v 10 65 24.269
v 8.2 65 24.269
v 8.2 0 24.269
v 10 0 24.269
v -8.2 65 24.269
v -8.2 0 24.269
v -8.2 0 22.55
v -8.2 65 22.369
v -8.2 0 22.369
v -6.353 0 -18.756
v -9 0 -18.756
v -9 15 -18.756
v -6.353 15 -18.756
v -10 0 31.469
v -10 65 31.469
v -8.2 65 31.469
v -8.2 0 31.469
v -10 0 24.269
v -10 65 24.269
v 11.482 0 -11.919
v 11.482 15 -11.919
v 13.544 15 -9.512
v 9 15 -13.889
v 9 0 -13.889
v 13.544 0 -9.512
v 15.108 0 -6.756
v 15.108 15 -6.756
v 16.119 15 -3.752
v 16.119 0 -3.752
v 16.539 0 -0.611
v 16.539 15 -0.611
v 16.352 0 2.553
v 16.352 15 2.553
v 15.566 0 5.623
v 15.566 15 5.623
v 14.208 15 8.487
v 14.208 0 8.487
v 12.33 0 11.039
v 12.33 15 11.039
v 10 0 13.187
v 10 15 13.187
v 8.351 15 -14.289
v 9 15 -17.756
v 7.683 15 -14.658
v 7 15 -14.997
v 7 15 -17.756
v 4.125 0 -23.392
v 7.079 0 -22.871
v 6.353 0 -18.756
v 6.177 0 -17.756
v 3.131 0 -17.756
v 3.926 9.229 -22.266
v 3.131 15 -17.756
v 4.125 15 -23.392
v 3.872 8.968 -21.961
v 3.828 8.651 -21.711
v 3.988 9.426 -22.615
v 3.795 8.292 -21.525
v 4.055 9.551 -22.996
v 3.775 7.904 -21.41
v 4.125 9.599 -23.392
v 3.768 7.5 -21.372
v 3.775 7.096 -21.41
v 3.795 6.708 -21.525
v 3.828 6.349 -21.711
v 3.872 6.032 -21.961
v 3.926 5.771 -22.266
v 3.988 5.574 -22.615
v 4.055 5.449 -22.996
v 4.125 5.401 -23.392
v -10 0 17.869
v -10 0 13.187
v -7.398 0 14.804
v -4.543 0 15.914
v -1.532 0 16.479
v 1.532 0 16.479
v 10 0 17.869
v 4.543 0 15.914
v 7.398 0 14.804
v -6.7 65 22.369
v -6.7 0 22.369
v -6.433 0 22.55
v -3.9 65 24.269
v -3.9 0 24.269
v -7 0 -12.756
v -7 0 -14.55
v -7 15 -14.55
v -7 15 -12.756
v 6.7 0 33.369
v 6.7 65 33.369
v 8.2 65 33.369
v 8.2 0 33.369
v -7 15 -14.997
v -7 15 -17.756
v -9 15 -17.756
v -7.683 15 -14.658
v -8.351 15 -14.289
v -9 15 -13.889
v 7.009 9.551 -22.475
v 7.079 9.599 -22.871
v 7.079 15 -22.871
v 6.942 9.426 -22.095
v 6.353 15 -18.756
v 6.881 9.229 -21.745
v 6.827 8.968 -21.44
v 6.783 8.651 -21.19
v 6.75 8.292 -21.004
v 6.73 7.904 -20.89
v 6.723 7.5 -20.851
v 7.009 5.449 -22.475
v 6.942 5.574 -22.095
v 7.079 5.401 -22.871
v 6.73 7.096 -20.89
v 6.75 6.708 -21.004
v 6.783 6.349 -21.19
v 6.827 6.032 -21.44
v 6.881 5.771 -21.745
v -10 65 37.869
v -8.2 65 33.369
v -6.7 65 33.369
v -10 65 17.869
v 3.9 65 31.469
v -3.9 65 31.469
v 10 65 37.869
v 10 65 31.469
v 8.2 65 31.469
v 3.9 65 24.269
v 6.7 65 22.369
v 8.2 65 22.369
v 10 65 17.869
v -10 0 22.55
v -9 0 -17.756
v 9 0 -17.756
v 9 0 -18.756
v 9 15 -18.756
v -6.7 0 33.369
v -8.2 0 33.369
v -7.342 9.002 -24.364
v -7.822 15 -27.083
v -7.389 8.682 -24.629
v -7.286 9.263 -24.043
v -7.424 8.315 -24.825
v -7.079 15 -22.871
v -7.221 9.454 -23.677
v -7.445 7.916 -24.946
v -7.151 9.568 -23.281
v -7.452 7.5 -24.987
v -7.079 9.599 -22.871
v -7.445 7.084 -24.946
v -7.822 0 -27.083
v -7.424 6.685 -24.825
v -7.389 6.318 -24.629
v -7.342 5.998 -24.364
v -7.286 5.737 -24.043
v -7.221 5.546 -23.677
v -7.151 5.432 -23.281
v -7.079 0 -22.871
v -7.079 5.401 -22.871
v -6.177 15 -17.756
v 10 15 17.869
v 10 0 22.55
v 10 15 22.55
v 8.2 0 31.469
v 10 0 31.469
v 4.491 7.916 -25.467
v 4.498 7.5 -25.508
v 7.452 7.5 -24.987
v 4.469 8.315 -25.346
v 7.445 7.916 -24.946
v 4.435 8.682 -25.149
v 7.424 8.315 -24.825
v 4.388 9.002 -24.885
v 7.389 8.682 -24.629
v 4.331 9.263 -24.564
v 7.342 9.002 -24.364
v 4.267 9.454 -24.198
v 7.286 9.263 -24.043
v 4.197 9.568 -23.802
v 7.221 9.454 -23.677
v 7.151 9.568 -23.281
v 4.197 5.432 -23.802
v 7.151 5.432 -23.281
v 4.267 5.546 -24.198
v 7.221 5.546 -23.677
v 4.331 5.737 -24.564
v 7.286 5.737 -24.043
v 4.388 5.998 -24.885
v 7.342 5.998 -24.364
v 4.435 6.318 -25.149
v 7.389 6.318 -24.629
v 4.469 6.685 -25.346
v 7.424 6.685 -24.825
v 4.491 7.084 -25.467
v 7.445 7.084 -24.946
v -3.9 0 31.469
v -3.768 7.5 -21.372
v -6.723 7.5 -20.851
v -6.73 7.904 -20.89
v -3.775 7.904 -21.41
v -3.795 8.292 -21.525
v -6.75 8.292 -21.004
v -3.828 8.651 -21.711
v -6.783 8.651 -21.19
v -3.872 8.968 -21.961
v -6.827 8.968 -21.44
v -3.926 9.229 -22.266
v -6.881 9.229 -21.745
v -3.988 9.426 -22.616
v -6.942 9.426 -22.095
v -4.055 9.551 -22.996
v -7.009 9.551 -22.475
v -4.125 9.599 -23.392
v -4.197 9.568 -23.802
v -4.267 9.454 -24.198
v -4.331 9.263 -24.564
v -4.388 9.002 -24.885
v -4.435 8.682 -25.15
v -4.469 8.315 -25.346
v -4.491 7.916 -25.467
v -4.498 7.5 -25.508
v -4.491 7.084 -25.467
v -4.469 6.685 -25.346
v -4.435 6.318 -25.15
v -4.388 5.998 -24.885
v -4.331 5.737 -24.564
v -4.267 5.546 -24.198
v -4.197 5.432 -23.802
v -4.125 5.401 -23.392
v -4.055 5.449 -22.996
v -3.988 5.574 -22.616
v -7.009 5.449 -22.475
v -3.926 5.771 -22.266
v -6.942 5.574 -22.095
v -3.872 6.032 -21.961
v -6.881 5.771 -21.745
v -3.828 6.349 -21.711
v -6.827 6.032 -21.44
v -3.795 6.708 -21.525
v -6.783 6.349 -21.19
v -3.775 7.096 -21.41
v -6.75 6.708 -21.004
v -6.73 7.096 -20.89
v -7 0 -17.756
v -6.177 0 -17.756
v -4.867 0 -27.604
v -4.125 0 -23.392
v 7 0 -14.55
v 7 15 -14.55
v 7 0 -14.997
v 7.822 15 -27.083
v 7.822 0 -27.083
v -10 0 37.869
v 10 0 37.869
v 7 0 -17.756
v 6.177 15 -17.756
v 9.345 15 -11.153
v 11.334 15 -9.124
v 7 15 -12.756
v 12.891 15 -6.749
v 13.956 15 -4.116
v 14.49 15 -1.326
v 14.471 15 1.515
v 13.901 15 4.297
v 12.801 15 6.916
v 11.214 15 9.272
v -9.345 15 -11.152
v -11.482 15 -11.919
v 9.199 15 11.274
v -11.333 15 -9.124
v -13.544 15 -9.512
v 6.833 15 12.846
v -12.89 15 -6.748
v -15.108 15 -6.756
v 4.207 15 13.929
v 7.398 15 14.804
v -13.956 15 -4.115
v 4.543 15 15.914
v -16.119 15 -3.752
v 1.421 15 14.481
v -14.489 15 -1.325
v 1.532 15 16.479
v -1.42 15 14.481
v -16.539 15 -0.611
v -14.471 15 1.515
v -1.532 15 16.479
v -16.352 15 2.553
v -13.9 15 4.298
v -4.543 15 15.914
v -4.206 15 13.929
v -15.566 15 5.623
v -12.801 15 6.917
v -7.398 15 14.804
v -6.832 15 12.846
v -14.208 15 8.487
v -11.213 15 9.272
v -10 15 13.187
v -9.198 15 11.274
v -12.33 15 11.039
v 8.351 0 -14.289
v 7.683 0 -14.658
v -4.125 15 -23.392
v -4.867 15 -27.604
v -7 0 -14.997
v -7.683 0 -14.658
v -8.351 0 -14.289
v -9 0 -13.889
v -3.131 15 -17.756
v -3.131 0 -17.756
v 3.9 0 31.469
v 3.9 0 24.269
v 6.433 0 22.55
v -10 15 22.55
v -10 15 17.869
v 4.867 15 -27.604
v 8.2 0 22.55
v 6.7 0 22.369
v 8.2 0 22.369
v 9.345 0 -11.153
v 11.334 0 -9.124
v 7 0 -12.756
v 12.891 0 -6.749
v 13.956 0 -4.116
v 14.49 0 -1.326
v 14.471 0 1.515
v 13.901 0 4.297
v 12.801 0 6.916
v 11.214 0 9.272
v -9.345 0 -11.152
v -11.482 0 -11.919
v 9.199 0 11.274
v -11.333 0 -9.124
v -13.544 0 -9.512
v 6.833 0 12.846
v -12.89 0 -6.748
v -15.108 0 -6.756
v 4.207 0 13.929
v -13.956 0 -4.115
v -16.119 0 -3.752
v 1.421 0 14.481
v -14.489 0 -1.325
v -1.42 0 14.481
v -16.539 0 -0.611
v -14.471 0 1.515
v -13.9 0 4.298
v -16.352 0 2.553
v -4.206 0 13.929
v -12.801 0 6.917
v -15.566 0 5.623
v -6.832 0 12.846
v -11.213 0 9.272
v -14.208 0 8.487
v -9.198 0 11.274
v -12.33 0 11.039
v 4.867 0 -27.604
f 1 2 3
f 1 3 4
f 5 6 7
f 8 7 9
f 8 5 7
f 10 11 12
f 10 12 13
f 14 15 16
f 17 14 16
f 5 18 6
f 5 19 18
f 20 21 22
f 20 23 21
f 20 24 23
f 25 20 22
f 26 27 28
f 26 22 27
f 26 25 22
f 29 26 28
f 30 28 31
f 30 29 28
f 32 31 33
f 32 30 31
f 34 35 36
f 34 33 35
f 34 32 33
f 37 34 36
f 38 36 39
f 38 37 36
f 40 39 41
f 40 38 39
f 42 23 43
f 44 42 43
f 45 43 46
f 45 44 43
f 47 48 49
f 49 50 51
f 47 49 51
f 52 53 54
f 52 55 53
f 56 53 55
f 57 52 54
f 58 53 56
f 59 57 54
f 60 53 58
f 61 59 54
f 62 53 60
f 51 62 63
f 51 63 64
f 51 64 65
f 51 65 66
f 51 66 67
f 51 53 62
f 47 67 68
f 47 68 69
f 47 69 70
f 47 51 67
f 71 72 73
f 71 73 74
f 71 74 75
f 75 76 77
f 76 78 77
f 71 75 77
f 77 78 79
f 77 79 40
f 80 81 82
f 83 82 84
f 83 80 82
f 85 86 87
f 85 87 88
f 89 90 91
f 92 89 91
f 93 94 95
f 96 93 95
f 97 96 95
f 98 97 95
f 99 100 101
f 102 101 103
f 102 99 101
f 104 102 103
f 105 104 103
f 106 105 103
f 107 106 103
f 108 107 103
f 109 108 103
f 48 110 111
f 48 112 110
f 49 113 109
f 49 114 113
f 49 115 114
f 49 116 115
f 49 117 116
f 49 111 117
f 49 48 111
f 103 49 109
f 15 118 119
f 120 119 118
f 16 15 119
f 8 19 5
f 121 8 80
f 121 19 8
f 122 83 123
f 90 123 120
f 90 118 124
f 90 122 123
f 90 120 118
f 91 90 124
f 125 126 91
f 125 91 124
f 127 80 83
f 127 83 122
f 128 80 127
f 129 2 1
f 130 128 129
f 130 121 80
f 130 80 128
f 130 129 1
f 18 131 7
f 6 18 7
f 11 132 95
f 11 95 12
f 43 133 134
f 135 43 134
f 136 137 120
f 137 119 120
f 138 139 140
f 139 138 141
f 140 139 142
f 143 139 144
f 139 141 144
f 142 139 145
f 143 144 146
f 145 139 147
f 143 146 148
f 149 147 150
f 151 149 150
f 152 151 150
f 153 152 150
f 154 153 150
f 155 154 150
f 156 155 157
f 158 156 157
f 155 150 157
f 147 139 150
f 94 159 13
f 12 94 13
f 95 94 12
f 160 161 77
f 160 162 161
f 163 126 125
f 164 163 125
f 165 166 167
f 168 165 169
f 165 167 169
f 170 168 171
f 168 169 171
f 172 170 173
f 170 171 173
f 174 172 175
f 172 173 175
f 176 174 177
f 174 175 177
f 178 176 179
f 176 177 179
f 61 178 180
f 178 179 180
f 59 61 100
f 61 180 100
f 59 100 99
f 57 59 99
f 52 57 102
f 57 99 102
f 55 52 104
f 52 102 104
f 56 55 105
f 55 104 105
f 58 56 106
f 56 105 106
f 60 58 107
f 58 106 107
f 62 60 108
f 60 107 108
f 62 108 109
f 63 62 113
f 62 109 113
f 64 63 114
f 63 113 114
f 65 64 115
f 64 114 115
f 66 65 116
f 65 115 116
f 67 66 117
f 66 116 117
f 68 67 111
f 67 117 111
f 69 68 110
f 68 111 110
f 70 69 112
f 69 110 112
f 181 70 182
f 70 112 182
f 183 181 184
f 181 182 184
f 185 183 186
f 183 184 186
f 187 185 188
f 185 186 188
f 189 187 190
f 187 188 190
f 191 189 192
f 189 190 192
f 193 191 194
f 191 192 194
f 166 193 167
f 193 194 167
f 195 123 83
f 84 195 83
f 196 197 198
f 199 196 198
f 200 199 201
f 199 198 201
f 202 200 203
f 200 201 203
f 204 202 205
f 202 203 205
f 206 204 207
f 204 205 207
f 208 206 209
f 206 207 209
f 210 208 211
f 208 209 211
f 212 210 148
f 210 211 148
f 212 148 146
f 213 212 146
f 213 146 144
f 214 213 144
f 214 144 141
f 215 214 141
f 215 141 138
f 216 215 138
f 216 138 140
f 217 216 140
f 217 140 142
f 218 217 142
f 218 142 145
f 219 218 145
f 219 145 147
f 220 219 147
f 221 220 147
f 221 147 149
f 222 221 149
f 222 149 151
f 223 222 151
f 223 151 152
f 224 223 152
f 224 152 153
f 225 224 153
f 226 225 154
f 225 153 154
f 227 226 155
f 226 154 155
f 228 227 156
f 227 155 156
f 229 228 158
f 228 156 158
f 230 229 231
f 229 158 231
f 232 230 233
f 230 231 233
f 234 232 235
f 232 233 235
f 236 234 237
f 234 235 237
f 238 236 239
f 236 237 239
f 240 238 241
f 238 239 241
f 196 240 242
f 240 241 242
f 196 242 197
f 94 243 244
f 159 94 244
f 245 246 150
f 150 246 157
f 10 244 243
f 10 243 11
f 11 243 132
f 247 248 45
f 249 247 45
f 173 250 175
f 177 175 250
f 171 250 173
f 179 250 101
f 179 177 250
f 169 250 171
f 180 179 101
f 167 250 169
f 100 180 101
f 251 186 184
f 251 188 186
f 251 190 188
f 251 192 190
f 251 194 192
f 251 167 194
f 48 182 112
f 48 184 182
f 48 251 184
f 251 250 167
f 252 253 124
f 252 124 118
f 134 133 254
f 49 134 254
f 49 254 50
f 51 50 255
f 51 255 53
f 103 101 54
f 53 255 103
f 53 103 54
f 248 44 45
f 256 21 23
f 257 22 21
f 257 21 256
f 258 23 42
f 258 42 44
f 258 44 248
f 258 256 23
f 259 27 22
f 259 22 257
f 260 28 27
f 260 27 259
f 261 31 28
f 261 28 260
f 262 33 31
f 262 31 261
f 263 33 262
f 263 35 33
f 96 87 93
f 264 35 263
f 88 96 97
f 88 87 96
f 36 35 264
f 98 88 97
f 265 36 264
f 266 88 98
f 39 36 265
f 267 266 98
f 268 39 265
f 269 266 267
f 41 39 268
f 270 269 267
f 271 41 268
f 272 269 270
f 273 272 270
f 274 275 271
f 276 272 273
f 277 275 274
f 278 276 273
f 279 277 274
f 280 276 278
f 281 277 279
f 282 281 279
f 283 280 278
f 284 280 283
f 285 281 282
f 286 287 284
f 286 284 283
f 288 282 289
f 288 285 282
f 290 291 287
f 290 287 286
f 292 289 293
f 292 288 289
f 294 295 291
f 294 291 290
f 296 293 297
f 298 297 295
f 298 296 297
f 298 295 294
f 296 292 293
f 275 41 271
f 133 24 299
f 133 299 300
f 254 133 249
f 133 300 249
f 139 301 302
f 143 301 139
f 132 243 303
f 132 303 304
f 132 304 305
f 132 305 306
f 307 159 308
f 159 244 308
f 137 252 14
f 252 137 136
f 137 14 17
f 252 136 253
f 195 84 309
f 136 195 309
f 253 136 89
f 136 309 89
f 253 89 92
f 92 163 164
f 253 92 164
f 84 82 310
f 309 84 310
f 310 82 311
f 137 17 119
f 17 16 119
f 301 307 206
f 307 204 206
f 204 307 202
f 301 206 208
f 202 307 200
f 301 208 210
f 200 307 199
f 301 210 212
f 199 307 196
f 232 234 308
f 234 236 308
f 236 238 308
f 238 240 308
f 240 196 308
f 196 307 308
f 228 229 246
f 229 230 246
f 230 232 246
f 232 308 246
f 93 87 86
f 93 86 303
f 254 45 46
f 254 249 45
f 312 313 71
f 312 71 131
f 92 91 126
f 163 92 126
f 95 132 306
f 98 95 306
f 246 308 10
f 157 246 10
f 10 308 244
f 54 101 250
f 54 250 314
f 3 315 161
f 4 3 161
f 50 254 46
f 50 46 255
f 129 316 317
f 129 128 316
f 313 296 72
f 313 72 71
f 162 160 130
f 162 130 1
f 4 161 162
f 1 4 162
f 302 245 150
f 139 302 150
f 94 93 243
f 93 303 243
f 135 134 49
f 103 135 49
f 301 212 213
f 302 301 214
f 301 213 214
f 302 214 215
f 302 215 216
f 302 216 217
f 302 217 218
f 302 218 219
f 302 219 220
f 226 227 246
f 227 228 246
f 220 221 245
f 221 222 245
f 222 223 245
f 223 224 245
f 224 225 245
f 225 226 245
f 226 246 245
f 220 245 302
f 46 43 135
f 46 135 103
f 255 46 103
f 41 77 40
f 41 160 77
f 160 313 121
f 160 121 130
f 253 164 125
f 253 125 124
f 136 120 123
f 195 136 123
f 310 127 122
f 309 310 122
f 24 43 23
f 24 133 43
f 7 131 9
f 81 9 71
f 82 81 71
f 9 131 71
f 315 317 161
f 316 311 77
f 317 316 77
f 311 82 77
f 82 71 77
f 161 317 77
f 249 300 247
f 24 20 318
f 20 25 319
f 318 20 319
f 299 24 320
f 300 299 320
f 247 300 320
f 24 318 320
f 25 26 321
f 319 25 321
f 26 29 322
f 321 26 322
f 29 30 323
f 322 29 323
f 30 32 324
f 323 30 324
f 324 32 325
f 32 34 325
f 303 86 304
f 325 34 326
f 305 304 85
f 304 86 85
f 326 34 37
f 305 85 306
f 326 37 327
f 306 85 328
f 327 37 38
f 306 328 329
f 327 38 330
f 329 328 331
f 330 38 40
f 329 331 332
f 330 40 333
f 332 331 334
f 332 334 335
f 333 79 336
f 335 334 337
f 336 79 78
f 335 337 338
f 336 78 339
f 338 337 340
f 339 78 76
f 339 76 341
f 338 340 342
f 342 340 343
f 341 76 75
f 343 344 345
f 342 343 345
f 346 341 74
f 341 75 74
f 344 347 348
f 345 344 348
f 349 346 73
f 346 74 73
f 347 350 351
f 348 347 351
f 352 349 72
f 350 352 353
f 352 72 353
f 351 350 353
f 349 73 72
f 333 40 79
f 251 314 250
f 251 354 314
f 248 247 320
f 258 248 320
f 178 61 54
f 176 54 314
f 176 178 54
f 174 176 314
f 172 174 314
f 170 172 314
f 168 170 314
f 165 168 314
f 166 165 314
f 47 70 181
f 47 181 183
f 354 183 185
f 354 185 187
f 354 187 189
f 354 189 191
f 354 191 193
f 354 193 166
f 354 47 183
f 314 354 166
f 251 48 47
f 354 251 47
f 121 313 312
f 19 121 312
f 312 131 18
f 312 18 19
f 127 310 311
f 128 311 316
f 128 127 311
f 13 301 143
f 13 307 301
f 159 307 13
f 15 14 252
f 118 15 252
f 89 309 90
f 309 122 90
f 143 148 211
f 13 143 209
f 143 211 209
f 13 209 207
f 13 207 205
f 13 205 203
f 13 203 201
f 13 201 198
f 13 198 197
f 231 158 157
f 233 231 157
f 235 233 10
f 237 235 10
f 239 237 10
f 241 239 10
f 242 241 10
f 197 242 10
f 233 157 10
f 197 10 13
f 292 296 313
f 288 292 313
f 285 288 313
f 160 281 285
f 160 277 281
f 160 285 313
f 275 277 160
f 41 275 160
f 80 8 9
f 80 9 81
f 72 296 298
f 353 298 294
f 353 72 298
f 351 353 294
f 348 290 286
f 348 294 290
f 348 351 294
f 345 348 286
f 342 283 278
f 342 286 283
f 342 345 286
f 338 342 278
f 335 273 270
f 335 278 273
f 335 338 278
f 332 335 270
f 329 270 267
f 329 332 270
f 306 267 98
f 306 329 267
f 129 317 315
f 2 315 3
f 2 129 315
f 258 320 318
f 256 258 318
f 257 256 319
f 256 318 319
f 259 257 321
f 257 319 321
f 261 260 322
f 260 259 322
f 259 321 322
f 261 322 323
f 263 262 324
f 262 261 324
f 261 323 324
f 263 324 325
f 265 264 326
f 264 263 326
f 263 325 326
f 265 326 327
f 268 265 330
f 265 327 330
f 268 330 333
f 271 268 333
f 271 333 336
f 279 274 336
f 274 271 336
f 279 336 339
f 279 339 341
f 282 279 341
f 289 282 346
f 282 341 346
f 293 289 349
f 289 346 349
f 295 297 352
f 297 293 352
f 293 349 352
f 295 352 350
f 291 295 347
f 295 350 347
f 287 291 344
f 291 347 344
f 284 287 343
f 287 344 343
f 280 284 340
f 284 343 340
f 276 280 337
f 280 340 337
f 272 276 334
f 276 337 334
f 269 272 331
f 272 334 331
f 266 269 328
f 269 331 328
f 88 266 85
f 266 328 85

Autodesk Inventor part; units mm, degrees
ref_plane "YZ Plane" through (0, 0, 0) normal (1, 0, 0) x (0, 1, 0)
ref_plane "XZ Plane" through (0, 0, 0) normal (0, 1, 0) x (-1, 0, 0)
ref_plane "XY Plane" through (0, 0, 0) normal (0, 0, 1) x (1, 0, 0)
sketch "스케치1" plane through (0, 0, 0) normal (0, 1, 0) x (-1, 0, 0)
  arc A0 (0, -14.55) -> (-2.5266, -14.329) centre (0, 0) ccw
  line L0 (-2.5656, -14.55) -> (-7, -14.55)
  line L1 (7, -14.55) -> (7, -12.7555)
  line L2 (-7, -14.55) -> (-7, -12.7555)
  arc A1 (2.8739, -16.2986) -> (-2.8739, -16.2986) centre (0, 0) ccw
  line L3 (7, -12.7555) -> (7, -17.7555)
  line L4 (-7, -12.7555) -> (-7, -17.7555)
  line L5 (-7, -17.7555) -> (-9, -17.7555)
  line L6 (-9, -17.7555) -> (-9, -13.8889)
  line L7 (7, -17.7555) -> (9, -17.7555)
  line L8 (9, -17.7555) -> (9, -13.8889)
  line L9 (0, 0) -> (23.7529, 0) construction
  line L10 (0, 0) -> (23.7529, 0) construction
  line L11 (4.1247, -23.3921) -> (7.0791, -22.8711)
  line L12 (7.0791, -22.8711) -> (6.1771, -17.7555)
  line L13 (-4.1247, -23.3921) -> (-7.0791, -22.8711)
  line L14 (-7.0791, -22.8711) -> (-6.1771, -17.7555)
  line L15 (-7, -17.7555) -> (-3.1308, -17.7555)
  line L16 (-9, -17.7555) -> (-9, -18.7555)
  line L17 (-9, -18.7555) -> (-6.3534, -18.7555)
  line L18 (9, -17.7555) -> (9, -18.7555)
  line L19 (9, -18.7555) -> (6.3534, -18.7555)
  line L20 (7, -17.7555) -> (6.1771, -17.7555)
  line L21 (6.1771, -17.7555) -> (3.1308, -17.7555)
  line L22 (0, 0) -> (-2.8739, -16.2986)
  line L23 (-3.1308, -17.7555) -> (-4.1247, -23.3921)
  line L24 (0, 0) -> (2.8739, -16.2986)
  line L25 (3.1308, -17.7555) -> (4.1247, -23.3921)
  line L26 (-7, -14.55) -> (-2.5656, -14.55)
  line L27 (0, -14.55) -> (7, -14.55)
  line L28 (3.1308, -17.7555) -> (4.8673, -27.6036)
  line L29 (4.8673, -27.6036) -> (7.8217, -27.0826)
  line L30 (7.8217, -27.0826) -> (7.0791, -22.8711)
  line L31 (-3.1308, -17.7555) -> (-4.8673, -27.6036)
  line L32 (-4.8673, -27.6036) -> (-7.8217, -27.0826)
  line L33 (-7.8217, -27.0826) -> (-7.0791, -22.8711)
  point P0 (-7, -14.9967)
  dimension "d0" = 29.1
  dimension "d1" = 7
  dimension "d2" = 14
  dimension "d3" = 2
  dimension "d4" = 5
  dimension "d5" = 2
  dimension "d6" = 2
  dimension "d7" = 5
  dimension "d10" = 3
  dimension "d11" = 1
  dimension "d14" = 10
  dimension "d15" = 10
extrude "돌출1" add sketch "스케치1" along normal blind 15 contours A0 L2 L4 A1 L3 L1 | A1 L8 L7 L3 | L4 L5 L6 A1 | L7 L18 L19 L12 L20 | L15 L14 L17 L16 L5 | L12 L11 L25 L21 | L15 L23 L13 L14 | L30 L29 L28 L11 | L13 L31 L32 L33
sketch "스케치2" plane through (7.8217, 0, -27.0826) normal (0.9848, 0, 0.1736) x (0.1736, 0, -0.9848)
  line L0 (0, 0) -> (0, 15) projected
  line L1 (-8.4556, 0) -> (-8.4556, 15) projected
  line L2 (0, 15) -> (-8.4556, 15)
  circle A0 centre (-4.2278, 7.5) radius 2.1
  point P0 (-28.0294, 0)
  dimension "d16" = 4.2
extrude "돌출2" cut sketch "스케치2" against normal up to surface (3 mm away)
sketch "스케치3" plane through (-6.3534, 0, -18.7555) normal (-0.9848, 0, 0.1736) x (0.1736, 0, 0.9848)
  line L0 (1.5444, 0) -> (-8.4556, 0) projected
  line L1 (0, 0) -> (0, 15) projected
  line L2 (-8.4556, 0) -> (0, 0)
  circle A0 centre (-4.2278, 7.5) radius 2.1
  point P0 (19.5738, 0)
  dimension "d19" = 4.2
extrude "돌출3" cut sketch "스케치3" against normal up to surface (3 mm away)
sketch "스케치4" plane through (0, 15, 0) normal (0, 1, 0) x (1, 0, 0)
  circle A0 centre (0, 0) radius 16.55
  line L0 (-10, -22.55) -> (10, -22.55)
  line L1 (10, -22.55) -> (10, -10.55)
  line L2 (10, -10.55) -> (-10, -10.55)
  line L3 (-10, -10.55) -> (-10, -22.55)
  arc A1 (-9, 13.8889) -> (9, 13.8889) centre (0, 0) ccw projected
  line L4 (-10, -22.55) -> (10, -10.55) construction
  line L5 (10, -22.55) -> (-10, -10.55) construction
  point P0 (0, -16.55)
  point P1 (10, -13.1872)
  point P2 (-10, -13.1872)
  dimension "d22" = 20
  dimension "d23" = 12
extrude "돌출4" add sketch "스케치4" against normal up to surface (15 mm away) contours L1 L0 L3 A0
sketch "스케치5" plane through (0, 15, 0) normal (0, 1, 0) x (1, 0, 0)
  line L0 (-10, -13.1872) -> (-10, -22.55) projected
  line L1 (-10, -17.8686) -> (10, -17.8686)
  line L2 (10, -17.8686) -> (10, -37.8686)
  line L3 (10, -37.8686) -> (-10, -37.8686)
  line L4 (-10, -37.8686) -> (-10, -17.8686)
  point P0 (0, 0)
  dimension "d26" = 20
  dimension "d27" = 20
extrude "돌출5" add sketch "스케치5" along normal blind 50 and the other way blind 15
sketch "스케치6" plane through (0, 65, 0) normal (0, 1, 0) x (1, 0, 0)
  line L0 (-10, -13.1872) -> (-10, -17.8686) projected
  line L1 (-10, -37.8686) -> (-10, -13.1872) projected
  line L2 (-10, -17.8686) -> (-10, -37.8686)
  line L3 (-10, -37.8686) -> (-10, -27.8686)
  line L4 (-10, -27.8686) -> (-10, -24.7686)
  line L5 (-10, -27.8686) -> (-10, -24.2686)
  line L6 (-10, -27.8686) -> (-10, -22.3686)
  line L7 (-10, -24.2686) -> (-8.2, -24.2686)
  line L8 (-8.2, -24.2686) -> (-8.2, -22.3686)
  line L9 (-8.2, -22.3686) -> (-6.7, -22.3686)
  line L10 (-10, -22.3686) -> (-3.9, -22.3686)
  line L11 (-6.7, -22.3686) -> (-3.9, -24.2686)
  line L12 (-3.9, -24.2686) -> (-3.9, -27.8686)
  line L13 (-10, -27.8686) -> (-3.9, -27.8686)
  line L14 (-10, -31.4686) -> (-8.2, -31.4686)
  line L15 (-8.2, -31.4686) -> (-8.2, -33.3686)
  line L16 (-8.2, -33.3686) -> (-6.7, -33.3686)
  line L17 (-6.7, -33.3686) -> (-3.9, -31.4686)
  line L18 (-3.9, -31.4686) -> (-3.9, -27.8686)
  line L19 (-10, -27.8686) -> (-10, -17.8686)
  point P0 (0, 0)
  point P1 (-10, -31.4686)
  dimension "d32" = 3.1
  dimension "d33" = 3.6
  dimension "d34" = 5.5
  dimension "d35" = 1.8
  dimension "d36" = 1.5
  dimension "d37" = 6.1
  dimension "d40" = 10
extrude "돌출6" cut sketch "스케치6" against normal through all contours L1 L13 L18 L17 L16 L15 L14 | L1 L7 L8 L9 L11 L12 L13
mirror "미러1" about plane through (0, 0, 0) normal (1, 0, 0) of "돌출6"
properties part number "USB_camera"
